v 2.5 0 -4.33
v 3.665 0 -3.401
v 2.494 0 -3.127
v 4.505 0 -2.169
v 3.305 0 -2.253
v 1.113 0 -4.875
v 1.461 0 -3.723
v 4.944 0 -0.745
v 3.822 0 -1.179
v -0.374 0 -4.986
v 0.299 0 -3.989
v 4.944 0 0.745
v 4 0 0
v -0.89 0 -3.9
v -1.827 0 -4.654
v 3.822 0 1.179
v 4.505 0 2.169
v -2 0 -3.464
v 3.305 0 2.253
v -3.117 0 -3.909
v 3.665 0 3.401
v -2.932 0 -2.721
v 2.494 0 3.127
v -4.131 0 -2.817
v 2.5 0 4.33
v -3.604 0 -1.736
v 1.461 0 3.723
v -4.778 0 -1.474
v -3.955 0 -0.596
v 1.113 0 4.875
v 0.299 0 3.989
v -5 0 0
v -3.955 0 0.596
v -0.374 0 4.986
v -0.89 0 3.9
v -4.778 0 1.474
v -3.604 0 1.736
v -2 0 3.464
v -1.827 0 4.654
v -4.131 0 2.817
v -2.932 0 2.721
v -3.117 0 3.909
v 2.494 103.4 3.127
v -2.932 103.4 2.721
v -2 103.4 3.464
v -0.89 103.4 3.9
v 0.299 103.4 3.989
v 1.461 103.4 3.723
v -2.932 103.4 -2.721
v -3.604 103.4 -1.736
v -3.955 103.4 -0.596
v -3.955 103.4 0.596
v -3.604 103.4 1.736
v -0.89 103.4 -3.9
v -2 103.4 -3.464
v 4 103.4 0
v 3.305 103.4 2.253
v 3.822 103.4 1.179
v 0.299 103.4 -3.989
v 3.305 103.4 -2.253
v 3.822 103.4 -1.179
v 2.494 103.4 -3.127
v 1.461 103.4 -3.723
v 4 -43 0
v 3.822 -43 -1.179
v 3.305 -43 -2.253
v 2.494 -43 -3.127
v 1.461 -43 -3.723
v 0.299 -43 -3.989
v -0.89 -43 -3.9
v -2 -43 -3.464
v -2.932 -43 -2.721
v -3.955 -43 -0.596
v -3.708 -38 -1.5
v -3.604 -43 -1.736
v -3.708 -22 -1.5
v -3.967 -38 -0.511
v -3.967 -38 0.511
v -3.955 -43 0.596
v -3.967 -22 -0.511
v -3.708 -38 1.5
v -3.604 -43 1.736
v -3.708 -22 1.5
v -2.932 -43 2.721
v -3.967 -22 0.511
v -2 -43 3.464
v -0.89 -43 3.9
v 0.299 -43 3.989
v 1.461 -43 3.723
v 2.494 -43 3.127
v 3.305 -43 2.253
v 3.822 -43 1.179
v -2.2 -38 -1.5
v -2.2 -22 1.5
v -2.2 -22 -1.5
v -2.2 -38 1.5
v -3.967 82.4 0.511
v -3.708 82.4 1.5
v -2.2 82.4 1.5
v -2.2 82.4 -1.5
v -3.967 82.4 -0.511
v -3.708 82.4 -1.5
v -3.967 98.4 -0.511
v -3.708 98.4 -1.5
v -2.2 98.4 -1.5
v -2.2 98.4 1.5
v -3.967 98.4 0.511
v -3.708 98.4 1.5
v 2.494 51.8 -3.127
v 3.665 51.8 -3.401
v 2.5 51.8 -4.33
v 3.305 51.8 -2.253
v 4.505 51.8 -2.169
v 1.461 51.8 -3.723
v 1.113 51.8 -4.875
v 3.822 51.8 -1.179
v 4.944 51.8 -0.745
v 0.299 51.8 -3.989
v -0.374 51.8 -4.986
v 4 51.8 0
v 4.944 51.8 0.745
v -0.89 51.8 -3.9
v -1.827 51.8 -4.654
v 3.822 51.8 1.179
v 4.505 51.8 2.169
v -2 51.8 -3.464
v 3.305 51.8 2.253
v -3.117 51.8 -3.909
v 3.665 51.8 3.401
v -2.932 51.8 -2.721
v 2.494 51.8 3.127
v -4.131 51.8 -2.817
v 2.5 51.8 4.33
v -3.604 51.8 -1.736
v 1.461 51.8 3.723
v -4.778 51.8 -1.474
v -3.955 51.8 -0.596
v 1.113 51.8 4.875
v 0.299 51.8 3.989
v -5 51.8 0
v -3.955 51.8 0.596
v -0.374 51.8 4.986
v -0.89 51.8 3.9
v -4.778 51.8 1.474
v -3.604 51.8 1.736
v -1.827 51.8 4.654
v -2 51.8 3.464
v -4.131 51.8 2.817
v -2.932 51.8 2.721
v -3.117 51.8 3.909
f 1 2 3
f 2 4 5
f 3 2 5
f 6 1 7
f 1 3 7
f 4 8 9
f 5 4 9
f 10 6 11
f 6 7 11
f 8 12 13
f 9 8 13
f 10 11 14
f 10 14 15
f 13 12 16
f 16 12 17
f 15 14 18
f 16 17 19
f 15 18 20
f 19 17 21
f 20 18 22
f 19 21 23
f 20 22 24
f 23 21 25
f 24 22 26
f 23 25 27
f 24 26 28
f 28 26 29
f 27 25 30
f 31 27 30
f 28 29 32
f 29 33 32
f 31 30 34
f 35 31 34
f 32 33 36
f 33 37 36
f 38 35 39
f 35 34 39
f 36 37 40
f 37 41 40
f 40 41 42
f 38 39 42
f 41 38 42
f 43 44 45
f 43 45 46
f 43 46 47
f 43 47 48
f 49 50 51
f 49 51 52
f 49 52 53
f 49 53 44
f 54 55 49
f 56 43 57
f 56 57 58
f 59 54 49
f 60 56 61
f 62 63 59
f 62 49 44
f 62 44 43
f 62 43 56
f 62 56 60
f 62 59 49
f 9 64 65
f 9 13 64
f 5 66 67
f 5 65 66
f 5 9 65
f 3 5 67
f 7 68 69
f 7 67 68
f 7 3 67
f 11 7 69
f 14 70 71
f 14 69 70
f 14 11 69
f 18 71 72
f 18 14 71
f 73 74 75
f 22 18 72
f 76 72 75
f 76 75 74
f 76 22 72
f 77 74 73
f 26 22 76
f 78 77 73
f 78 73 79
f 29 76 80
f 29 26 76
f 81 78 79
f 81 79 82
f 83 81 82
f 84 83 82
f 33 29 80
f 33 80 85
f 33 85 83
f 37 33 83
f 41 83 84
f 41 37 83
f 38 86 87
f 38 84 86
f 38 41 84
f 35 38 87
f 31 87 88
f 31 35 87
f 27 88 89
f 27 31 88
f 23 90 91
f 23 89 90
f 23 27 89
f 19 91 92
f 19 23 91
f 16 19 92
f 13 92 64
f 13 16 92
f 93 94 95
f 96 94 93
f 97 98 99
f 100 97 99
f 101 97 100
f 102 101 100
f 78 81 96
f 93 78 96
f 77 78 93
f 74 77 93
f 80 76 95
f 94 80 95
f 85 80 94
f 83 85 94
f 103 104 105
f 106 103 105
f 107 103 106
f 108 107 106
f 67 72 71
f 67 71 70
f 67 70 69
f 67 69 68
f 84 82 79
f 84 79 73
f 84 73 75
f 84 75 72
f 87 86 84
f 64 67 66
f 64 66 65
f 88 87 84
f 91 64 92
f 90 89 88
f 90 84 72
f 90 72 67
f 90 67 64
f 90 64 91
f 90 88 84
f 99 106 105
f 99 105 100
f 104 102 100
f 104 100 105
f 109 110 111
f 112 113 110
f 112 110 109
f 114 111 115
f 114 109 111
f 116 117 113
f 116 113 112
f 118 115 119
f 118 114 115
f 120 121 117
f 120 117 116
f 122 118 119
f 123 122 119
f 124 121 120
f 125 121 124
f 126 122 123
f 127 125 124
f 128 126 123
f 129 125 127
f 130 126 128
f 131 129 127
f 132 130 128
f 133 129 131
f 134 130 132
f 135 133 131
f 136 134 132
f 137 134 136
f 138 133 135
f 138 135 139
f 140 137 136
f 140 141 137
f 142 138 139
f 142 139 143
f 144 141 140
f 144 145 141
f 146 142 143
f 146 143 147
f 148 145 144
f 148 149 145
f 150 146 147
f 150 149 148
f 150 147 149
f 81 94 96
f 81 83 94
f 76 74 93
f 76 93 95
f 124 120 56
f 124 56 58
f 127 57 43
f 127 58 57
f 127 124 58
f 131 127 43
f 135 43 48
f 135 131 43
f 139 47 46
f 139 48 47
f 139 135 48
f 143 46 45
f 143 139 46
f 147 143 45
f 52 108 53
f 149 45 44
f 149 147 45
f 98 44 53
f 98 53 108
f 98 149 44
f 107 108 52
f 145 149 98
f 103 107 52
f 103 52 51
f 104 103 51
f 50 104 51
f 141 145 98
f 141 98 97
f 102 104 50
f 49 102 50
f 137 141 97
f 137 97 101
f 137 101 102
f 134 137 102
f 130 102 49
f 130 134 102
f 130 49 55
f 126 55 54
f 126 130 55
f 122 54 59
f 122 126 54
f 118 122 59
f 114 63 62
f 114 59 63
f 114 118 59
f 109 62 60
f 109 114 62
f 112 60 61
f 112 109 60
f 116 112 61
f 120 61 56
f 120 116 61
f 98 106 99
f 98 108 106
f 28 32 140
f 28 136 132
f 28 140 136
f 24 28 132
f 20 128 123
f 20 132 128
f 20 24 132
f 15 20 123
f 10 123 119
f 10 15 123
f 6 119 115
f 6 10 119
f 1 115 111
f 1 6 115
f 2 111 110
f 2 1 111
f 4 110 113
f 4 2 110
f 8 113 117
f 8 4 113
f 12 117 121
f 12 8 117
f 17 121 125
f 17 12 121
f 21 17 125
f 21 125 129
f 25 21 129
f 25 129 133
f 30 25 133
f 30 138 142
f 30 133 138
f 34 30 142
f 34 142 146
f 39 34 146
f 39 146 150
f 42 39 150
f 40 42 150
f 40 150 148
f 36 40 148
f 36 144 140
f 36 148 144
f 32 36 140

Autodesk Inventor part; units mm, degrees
ref_plane "YZ Plane" through (0, 0, 0) normal (1, 0, 0) x (0, 1, 0)
ref_plane "XZ Plane" through (0, 0, 0) normal (0, 1, 0) x (-1, 0, 0)
sketch "スケッチ1" plane through (0, 0, 0) normal (0, 1, 0) x (-1, 0, 0)
  circle A0 centre (0, 0) radius 5
  dimension "d0" = 10
extrude "押し出し1" add sketch "スケッチ1" along normal blind 51.8
sketch "スケッチ2" plane through (0, 51.8, 0) normal (0, 1, 0) x (1, 0, 0)
  circle A0 centre (0, 0) radius 4
  dimension "d3" = 8
extrude "押し出し2" add sketch "スケッチ2" along normal blind 51.6
sketch "スケッチ3" plane through (0, 0, 0) normal (0, -1, 0) x (1, 0, 0)
  circle A0 centre (0, 0) radius 5 projected
  circle A1 centre (0, 0) radius 4
  dimension "d6" = 8
extrude "押し出し3" add sketch "スケッチ3" along normal blind 43 contours A1
sketch "スケッチ4" plane through (0, 103.4, 0) normal (0, 1, 0) x (1, 0, 0)
  circle A0 centre (0, 0) radius 4 projected
  point P0 (-4, 0)
ref_plane "作業平面1" through (-4, 103.4, 0) normal (-1, 0, 0) x (0, -1, 0)
sketch "スケッチ5" plane through (-4, 103.4, 0) normal (-1, 0, 0) x (0, -1, 0)
  line L0 (5, 1.5) -> (21, 1.5)
  line L1 (21, 1.5) -> (21, -1.5)
  line L2 (21, -1.5) -> (5, -1.5)
  line L3 (5, -1.5) -> (5, 1.5)
  line L4 (5, 1.5) -> (21, -1.5) construction
  line L5 (21, 1.5) -> (5, -1.5) construction
  line L6 (0, 4) -> (0, -4) projected
  point P0 (103.4, 0)
  point P1 (13, 0)
  dimension "d10" = 16
  dimension "d11" = 3
  dimension "d12" = 5
extrude "押し出し4" cut sketch "スケッチ5" against normal blind 1.8
sketch "スケッチ6" plane through (-4, 103.4, 0) normal (-1, 0, 0) x (0, -1, 0)
  line L0 (125.4, 1.5) -> (141.4, 1.5)
  line L1 (141.4, 1.5) -> (141.4, -1.5)
  line L2 (141.4, -1.5) -> (125.4, -1.5)
  line L3 (125.4, -1.5) -> (125.4, 1.5)
  line L4 (125.4, 1.5) -> (141.4, -1.5) construction
  line L5 (141.4, 1.5) -> (125.4, -1.5) construction
  line L6 (146.4, -4) -> (146.4, 4) projected
  point P0 (103.4, 0)
  point P1 (133.4, 0)
  dimension "d18" = 16
  dimension "d19" = 3
  dimension "d20" = 5
extrude "押し出し5" cut sketch "スケッチ6" against normal blind 1.8
properties part number "elbow_shaft" material "鋼、炭素鋼"
